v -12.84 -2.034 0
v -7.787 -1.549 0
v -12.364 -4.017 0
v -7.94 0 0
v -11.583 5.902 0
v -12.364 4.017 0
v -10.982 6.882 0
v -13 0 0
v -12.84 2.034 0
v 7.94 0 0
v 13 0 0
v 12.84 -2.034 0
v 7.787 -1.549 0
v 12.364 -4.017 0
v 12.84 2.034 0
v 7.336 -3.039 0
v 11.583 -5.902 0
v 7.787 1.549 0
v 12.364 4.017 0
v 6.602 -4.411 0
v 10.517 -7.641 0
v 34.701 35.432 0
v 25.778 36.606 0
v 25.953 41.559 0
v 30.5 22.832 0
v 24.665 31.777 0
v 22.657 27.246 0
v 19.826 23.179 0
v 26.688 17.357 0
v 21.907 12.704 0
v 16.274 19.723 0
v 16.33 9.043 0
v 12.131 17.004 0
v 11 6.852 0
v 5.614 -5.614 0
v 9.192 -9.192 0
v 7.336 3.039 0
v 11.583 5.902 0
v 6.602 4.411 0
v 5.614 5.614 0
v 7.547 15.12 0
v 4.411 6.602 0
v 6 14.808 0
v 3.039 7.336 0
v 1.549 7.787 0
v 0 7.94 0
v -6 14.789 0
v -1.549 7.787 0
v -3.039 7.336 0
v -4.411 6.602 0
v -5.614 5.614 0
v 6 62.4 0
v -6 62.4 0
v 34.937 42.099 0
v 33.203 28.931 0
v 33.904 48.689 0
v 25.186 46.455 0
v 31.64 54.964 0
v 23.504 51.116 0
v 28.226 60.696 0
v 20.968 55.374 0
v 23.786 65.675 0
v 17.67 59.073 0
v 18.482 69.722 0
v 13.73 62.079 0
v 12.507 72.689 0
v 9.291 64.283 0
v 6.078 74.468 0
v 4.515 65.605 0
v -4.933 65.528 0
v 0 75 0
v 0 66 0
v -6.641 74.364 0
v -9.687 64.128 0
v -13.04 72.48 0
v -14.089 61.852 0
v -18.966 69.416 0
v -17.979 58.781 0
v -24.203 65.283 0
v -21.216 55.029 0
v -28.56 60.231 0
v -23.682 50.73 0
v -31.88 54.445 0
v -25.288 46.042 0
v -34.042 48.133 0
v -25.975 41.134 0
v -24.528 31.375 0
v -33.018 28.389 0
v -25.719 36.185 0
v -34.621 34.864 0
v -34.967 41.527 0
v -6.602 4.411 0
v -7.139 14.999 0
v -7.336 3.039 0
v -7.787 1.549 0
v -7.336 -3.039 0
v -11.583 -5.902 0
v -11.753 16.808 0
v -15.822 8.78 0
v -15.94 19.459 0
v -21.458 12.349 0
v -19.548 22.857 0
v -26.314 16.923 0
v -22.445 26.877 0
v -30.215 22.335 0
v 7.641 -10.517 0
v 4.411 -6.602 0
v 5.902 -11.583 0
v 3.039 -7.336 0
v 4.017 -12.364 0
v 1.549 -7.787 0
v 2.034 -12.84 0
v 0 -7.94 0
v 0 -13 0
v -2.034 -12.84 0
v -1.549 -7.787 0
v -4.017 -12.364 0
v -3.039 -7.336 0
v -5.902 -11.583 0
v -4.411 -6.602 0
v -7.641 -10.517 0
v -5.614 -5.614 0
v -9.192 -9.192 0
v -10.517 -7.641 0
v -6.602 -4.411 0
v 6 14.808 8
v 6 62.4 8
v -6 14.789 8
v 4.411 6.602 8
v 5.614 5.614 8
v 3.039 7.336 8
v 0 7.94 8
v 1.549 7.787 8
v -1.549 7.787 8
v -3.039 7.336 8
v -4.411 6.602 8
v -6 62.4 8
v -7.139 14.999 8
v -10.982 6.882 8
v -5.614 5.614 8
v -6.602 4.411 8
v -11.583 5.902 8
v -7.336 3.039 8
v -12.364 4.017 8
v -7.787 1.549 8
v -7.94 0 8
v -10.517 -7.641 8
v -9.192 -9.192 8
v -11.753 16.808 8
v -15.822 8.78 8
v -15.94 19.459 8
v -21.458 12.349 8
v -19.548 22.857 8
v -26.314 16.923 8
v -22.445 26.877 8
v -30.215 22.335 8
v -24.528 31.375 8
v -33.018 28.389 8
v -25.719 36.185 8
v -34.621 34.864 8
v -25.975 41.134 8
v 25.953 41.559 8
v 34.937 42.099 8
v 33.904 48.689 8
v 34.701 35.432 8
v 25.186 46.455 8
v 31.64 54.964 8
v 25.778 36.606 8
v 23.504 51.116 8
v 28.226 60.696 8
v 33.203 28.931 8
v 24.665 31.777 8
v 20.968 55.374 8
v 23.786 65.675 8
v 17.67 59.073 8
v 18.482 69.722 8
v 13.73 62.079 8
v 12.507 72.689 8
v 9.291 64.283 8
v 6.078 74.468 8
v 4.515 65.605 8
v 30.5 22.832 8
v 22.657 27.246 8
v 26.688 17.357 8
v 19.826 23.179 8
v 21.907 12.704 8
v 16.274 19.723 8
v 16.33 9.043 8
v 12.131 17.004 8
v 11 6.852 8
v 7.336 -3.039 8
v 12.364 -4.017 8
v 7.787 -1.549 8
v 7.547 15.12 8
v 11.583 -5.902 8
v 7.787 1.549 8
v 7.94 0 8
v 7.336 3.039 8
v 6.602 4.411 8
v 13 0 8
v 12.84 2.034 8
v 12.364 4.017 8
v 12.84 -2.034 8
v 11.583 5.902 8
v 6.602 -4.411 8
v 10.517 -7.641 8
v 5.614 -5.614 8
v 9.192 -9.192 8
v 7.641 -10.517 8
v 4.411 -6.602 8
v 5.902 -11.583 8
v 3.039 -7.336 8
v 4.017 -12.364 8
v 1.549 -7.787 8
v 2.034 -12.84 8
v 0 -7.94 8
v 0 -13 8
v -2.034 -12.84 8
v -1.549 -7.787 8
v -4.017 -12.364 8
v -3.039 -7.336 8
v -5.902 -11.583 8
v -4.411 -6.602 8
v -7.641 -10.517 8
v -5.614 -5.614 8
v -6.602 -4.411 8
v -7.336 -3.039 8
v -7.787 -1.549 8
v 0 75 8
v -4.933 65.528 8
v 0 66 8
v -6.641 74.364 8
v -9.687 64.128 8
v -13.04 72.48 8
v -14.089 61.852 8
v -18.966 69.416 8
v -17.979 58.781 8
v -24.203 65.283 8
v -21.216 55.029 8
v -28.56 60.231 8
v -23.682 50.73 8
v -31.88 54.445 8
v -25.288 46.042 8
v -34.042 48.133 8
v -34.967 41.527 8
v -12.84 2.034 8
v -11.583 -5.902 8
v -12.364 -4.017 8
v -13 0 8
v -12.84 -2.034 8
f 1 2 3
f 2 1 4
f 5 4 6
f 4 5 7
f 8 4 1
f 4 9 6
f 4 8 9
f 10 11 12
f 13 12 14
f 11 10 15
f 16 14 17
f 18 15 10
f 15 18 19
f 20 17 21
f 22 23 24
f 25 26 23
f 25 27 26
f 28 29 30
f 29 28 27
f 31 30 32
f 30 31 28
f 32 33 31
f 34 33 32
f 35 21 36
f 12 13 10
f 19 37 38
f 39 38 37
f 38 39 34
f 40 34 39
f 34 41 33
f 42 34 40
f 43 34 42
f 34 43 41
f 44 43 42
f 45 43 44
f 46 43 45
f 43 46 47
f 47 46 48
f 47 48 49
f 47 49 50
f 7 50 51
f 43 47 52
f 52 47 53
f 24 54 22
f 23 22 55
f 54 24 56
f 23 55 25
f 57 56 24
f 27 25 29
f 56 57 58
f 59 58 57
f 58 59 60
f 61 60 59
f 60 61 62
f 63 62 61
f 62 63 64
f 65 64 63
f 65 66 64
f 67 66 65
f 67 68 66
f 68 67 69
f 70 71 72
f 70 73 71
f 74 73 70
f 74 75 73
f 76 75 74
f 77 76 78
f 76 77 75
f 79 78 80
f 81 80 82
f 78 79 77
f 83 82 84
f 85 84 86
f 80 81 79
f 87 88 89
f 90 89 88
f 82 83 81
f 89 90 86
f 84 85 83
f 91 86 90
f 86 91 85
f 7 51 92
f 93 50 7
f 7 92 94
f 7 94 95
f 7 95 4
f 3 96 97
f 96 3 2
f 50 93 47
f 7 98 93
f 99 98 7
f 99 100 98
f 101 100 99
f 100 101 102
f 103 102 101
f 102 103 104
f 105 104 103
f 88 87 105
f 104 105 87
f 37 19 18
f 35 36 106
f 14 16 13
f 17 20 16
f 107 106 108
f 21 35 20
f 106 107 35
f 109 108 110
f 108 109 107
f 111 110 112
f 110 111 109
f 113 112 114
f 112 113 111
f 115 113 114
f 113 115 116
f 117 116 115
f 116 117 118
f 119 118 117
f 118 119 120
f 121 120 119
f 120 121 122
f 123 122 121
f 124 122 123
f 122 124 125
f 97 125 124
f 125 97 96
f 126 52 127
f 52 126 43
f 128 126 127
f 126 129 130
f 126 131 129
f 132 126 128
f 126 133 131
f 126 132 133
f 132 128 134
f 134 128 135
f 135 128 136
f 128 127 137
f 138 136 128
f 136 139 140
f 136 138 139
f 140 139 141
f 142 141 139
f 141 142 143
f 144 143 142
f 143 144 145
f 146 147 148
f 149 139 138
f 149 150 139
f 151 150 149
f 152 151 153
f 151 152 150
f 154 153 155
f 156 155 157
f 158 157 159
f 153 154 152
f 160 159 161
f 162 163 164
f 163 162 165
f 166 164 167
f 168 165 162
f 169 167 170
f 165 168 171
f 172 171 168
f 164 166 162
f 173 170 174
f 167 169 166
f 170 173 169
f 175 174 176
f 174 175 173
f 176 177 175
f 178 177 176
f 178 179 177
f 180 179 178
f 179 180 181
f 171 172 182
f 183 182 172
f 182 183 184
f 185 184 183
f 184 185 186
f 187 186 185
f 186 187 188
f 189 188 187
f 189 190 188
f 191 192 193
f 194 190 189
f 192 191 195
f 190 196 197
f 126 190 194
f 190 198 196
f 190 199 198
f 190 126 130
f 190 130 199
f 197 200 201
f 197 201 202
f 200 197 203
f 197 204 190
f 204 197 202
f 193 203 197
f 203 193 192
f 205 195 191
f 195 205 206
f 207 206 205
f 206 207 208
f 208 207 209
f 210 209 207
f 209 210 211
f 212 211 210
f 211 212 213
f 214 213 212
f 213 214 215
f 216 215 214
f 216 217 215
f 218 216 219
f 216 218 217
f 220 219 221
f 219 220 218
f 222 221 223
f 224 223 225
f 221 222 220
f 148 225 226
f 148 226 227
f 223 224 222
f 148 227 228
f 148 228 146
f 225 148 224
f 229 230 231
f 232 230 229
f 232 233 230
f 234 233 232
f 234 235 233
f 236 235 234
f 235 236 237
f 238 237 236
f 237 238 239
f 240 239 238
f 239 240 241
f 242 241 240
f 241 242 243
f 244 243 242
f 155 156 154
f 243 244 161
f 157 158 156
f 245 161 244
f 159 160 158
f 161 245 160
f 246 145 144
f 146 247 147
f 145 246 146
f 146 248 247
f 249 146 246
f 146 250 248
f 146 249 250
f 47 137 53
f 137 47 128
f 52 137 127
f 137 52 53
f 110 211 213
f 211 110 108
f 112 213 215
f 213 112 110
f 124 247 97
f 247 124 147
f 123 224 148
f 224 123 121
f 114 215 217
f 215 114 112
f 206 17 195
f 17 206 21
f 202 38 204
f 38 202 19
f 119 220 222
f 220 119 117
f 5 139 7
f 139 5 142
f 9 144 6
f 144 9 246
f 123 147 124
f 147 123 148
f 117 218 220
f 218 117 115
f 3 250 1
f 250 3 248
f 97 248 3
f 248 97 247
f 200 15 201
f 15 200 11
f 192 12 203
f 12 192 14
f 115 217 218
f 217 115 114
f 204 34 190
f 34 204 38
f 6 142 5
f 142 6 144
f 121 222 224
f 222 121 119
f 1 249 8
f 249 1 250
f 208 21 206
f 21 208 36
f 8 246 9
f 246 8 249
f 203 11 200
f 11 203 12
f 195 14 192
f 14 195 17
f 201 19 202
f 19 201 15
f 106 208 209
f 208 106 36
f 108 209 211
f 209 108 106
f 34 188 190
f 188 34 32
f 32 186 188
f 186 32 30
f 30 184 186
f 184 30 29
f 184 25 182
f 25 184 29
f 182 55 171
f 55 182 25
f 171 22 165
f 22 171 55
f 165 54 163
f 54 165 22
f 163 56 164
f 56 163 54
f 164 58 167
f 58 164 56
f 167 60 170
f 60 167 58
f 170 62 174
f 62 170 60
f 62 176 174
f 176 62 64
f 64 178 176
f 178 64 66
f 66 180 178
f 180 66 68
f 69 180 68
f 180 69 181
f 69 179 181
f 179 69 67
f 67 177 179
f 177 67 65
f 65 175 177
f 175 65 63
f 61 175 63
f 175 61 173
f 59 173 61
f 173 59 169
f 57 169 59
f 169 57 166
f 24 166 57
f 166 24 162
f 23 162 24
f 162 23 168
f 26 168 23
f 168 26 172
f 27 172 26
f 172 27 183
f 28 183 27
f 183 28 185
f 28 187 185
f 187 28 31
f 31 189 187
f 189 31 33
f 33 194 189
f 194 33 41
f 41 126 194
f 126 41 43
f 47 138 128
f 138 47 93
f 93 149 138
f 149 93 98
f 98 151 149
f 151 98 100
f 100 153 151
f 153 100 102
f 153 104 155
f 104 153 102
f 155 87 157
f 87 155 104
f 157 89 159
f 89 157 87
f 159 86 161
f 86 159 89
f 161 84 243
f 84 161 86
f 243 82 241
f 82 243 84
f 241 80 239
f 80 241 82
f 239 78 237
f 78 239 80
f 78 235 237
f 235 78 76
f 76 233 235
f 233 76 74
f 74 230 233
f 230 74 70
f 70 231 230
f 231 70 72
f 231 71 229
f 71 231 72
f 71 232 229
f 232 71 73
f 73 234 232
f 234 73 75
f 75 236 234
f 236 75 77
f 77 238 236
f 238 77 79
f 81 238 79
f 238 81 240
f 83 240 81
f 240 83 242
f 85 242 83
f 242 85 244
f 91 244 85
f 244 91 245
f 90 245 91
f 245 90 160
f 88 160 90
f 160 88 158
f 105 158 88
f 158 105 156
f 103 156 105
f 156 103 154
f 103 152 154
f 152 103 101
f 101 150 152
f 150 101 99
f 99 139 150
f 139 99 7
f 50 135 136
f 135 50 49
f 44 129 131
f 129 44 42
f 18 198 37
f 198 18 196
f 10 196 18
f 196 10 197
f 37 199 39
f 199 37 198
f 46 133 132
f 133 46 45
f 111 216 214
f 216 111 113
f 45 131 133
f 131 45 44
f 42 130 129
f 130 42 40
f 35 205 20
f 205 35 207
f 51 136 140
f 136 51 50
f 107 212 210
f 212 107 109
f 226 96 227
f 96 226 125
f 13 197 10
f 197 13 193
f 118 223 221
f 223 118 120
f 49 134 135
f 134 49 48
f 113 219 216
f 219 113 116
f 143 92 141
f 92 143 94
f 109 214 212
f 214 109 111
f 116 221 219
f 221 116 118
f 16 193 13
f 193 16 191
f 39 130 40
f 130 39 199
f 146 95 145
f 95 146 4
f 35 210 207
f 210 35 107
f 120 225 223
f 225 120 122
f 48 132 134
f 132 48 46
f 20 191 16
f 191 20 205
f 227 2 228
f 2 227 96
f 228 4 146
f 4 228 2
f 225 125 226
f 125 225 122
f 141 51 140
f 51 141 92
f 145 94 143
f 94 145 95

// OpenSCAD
$fn = 32;

// ----------------------------------------------------------------------
// Hook: 80 mm shank into a 26 mm curl, 8 mm thick
// ----------------------------------------------------------------------

// --- parameters (mm) ---
shank_len = 80;           // shank length from the boss centre
shank_w = 12;             // shank width
boss_d = 26;              // boss diameter
bore_d = 15.88;           // boss bore
curl_in = 26;             // curl inner radius
curl_out = 35;            // curl outer radius
curl_sweep = 350;         // curl sweep angle
hook_t = 8;               // hook thickness

shank_profile = [[-6, 62.4], [6, 62.4], [6, 11], [-6, 11]];
boss_profile = [[13, 0], [12.84, 2.034], [12.364, 4.017], [11.583, 5.902], [10.517, 7.641], [9.192, 9.192], [7.641, 10.517], [5.902, 11.583], [4.017, 12.364], [2.034, 12.84], [0, 13], [-2.034, 12.84], [-4.017, 12.364], [-5.902, 11.583], [-7.641, 10.517], [-9.192, 9.192], [-10.517, 7.641], [-11.583, 5.902], [-12.364, 4.017], [-12.84, 2.034], [-13, 0], [-12.84, -2.034], [-12.364, -4.017], [-11.583, -5.902], [-10.517, -7.641], [-9.192, -9.192], [-7.641, -10.517], [-5.902, -11.583], [-4.017, -12.364], [-2.034, -12.84], [0, -13], [2.034, -12.84], [4.017, -12.364], [5.902, -11.583], [7.641, -10.517], [9.192, -9.192], [10.517, -7.641], [11.583, -5.902], [12.364, -4.017], [12.84, -2.034]];
curl_profile = [[0, 75], [-6.641, 74.364], [-13.04, 72.48], [-18.966, 69.416], [-24.203, 65.283], [-28.56, 60.231], [-31.88, 54.445], [-34.042, 48.133], [-34.967, 41.527], [-34.621, 34.864], [-33.018, 28.389], [-30.215, 22.335], [-26.314, 16.923], [-21.458, 12.349], [-15.822, 8.78], [-9.611, 6.345], [-3.05, 5.133], [3.621, 5.188], [10.16, 6.507], [16.33, 9.043], [21.907, 12.704], [26.688, 17.357], [30.5, 22.832], [33.203, 28.931], [34.701, 35.432], [34.937, 42.099], [33.904, 48.689], [31.64, 54.964], [28.226, 60.696], [23.786, 65.675], [18.482, 69.722], [12.507, 72.689], [6.078, 74.468], [4.515, 65.605], [9.291, 64.283], [13.73, 62.079], [17.67, 59.073], [20.968, 55.374], [23.504, 51.116], [25.186, 46.455], [25.953, 41.559], [25.778, 36.606], [24.665, 31.777], [22.657, 27.246], [19.826, 23.179], [16.274, 19.723], [12.131, 17.004], [7.547, 15.12], [2.69, 14.139], [-2.266, 14.099], [-7.139, 14.999], [-11.753, 16.808], [-15.94, 19.459], [-19.548, 22.857], [-22.445, 26.877], [-24.528, 31.375], [-25.719, 36.185], [-25.975, 41.134], [-25.288, 46.042], [-23.682, 50.73], [-21.216, 55.029], [-17.979, 58.781], [-14.089, 61.852], [-9.687, 64.128], [-4.933, 65.528], [0, 66]];

difference() {
  union() {
    /* three overlapping outlines: shank, boss and the smooth curl */
    linear_extrude(height = hook_t) polygon(shank_profile);
    linear_extrude(height = hook_t) polygon(boss_profile);
    linear_extrude(height = hook_t) polygon(curl_profile);
  }
  translate([0, 0, -2.5]) cylinder(h = hook_t + 5, d = bore_d);
}
